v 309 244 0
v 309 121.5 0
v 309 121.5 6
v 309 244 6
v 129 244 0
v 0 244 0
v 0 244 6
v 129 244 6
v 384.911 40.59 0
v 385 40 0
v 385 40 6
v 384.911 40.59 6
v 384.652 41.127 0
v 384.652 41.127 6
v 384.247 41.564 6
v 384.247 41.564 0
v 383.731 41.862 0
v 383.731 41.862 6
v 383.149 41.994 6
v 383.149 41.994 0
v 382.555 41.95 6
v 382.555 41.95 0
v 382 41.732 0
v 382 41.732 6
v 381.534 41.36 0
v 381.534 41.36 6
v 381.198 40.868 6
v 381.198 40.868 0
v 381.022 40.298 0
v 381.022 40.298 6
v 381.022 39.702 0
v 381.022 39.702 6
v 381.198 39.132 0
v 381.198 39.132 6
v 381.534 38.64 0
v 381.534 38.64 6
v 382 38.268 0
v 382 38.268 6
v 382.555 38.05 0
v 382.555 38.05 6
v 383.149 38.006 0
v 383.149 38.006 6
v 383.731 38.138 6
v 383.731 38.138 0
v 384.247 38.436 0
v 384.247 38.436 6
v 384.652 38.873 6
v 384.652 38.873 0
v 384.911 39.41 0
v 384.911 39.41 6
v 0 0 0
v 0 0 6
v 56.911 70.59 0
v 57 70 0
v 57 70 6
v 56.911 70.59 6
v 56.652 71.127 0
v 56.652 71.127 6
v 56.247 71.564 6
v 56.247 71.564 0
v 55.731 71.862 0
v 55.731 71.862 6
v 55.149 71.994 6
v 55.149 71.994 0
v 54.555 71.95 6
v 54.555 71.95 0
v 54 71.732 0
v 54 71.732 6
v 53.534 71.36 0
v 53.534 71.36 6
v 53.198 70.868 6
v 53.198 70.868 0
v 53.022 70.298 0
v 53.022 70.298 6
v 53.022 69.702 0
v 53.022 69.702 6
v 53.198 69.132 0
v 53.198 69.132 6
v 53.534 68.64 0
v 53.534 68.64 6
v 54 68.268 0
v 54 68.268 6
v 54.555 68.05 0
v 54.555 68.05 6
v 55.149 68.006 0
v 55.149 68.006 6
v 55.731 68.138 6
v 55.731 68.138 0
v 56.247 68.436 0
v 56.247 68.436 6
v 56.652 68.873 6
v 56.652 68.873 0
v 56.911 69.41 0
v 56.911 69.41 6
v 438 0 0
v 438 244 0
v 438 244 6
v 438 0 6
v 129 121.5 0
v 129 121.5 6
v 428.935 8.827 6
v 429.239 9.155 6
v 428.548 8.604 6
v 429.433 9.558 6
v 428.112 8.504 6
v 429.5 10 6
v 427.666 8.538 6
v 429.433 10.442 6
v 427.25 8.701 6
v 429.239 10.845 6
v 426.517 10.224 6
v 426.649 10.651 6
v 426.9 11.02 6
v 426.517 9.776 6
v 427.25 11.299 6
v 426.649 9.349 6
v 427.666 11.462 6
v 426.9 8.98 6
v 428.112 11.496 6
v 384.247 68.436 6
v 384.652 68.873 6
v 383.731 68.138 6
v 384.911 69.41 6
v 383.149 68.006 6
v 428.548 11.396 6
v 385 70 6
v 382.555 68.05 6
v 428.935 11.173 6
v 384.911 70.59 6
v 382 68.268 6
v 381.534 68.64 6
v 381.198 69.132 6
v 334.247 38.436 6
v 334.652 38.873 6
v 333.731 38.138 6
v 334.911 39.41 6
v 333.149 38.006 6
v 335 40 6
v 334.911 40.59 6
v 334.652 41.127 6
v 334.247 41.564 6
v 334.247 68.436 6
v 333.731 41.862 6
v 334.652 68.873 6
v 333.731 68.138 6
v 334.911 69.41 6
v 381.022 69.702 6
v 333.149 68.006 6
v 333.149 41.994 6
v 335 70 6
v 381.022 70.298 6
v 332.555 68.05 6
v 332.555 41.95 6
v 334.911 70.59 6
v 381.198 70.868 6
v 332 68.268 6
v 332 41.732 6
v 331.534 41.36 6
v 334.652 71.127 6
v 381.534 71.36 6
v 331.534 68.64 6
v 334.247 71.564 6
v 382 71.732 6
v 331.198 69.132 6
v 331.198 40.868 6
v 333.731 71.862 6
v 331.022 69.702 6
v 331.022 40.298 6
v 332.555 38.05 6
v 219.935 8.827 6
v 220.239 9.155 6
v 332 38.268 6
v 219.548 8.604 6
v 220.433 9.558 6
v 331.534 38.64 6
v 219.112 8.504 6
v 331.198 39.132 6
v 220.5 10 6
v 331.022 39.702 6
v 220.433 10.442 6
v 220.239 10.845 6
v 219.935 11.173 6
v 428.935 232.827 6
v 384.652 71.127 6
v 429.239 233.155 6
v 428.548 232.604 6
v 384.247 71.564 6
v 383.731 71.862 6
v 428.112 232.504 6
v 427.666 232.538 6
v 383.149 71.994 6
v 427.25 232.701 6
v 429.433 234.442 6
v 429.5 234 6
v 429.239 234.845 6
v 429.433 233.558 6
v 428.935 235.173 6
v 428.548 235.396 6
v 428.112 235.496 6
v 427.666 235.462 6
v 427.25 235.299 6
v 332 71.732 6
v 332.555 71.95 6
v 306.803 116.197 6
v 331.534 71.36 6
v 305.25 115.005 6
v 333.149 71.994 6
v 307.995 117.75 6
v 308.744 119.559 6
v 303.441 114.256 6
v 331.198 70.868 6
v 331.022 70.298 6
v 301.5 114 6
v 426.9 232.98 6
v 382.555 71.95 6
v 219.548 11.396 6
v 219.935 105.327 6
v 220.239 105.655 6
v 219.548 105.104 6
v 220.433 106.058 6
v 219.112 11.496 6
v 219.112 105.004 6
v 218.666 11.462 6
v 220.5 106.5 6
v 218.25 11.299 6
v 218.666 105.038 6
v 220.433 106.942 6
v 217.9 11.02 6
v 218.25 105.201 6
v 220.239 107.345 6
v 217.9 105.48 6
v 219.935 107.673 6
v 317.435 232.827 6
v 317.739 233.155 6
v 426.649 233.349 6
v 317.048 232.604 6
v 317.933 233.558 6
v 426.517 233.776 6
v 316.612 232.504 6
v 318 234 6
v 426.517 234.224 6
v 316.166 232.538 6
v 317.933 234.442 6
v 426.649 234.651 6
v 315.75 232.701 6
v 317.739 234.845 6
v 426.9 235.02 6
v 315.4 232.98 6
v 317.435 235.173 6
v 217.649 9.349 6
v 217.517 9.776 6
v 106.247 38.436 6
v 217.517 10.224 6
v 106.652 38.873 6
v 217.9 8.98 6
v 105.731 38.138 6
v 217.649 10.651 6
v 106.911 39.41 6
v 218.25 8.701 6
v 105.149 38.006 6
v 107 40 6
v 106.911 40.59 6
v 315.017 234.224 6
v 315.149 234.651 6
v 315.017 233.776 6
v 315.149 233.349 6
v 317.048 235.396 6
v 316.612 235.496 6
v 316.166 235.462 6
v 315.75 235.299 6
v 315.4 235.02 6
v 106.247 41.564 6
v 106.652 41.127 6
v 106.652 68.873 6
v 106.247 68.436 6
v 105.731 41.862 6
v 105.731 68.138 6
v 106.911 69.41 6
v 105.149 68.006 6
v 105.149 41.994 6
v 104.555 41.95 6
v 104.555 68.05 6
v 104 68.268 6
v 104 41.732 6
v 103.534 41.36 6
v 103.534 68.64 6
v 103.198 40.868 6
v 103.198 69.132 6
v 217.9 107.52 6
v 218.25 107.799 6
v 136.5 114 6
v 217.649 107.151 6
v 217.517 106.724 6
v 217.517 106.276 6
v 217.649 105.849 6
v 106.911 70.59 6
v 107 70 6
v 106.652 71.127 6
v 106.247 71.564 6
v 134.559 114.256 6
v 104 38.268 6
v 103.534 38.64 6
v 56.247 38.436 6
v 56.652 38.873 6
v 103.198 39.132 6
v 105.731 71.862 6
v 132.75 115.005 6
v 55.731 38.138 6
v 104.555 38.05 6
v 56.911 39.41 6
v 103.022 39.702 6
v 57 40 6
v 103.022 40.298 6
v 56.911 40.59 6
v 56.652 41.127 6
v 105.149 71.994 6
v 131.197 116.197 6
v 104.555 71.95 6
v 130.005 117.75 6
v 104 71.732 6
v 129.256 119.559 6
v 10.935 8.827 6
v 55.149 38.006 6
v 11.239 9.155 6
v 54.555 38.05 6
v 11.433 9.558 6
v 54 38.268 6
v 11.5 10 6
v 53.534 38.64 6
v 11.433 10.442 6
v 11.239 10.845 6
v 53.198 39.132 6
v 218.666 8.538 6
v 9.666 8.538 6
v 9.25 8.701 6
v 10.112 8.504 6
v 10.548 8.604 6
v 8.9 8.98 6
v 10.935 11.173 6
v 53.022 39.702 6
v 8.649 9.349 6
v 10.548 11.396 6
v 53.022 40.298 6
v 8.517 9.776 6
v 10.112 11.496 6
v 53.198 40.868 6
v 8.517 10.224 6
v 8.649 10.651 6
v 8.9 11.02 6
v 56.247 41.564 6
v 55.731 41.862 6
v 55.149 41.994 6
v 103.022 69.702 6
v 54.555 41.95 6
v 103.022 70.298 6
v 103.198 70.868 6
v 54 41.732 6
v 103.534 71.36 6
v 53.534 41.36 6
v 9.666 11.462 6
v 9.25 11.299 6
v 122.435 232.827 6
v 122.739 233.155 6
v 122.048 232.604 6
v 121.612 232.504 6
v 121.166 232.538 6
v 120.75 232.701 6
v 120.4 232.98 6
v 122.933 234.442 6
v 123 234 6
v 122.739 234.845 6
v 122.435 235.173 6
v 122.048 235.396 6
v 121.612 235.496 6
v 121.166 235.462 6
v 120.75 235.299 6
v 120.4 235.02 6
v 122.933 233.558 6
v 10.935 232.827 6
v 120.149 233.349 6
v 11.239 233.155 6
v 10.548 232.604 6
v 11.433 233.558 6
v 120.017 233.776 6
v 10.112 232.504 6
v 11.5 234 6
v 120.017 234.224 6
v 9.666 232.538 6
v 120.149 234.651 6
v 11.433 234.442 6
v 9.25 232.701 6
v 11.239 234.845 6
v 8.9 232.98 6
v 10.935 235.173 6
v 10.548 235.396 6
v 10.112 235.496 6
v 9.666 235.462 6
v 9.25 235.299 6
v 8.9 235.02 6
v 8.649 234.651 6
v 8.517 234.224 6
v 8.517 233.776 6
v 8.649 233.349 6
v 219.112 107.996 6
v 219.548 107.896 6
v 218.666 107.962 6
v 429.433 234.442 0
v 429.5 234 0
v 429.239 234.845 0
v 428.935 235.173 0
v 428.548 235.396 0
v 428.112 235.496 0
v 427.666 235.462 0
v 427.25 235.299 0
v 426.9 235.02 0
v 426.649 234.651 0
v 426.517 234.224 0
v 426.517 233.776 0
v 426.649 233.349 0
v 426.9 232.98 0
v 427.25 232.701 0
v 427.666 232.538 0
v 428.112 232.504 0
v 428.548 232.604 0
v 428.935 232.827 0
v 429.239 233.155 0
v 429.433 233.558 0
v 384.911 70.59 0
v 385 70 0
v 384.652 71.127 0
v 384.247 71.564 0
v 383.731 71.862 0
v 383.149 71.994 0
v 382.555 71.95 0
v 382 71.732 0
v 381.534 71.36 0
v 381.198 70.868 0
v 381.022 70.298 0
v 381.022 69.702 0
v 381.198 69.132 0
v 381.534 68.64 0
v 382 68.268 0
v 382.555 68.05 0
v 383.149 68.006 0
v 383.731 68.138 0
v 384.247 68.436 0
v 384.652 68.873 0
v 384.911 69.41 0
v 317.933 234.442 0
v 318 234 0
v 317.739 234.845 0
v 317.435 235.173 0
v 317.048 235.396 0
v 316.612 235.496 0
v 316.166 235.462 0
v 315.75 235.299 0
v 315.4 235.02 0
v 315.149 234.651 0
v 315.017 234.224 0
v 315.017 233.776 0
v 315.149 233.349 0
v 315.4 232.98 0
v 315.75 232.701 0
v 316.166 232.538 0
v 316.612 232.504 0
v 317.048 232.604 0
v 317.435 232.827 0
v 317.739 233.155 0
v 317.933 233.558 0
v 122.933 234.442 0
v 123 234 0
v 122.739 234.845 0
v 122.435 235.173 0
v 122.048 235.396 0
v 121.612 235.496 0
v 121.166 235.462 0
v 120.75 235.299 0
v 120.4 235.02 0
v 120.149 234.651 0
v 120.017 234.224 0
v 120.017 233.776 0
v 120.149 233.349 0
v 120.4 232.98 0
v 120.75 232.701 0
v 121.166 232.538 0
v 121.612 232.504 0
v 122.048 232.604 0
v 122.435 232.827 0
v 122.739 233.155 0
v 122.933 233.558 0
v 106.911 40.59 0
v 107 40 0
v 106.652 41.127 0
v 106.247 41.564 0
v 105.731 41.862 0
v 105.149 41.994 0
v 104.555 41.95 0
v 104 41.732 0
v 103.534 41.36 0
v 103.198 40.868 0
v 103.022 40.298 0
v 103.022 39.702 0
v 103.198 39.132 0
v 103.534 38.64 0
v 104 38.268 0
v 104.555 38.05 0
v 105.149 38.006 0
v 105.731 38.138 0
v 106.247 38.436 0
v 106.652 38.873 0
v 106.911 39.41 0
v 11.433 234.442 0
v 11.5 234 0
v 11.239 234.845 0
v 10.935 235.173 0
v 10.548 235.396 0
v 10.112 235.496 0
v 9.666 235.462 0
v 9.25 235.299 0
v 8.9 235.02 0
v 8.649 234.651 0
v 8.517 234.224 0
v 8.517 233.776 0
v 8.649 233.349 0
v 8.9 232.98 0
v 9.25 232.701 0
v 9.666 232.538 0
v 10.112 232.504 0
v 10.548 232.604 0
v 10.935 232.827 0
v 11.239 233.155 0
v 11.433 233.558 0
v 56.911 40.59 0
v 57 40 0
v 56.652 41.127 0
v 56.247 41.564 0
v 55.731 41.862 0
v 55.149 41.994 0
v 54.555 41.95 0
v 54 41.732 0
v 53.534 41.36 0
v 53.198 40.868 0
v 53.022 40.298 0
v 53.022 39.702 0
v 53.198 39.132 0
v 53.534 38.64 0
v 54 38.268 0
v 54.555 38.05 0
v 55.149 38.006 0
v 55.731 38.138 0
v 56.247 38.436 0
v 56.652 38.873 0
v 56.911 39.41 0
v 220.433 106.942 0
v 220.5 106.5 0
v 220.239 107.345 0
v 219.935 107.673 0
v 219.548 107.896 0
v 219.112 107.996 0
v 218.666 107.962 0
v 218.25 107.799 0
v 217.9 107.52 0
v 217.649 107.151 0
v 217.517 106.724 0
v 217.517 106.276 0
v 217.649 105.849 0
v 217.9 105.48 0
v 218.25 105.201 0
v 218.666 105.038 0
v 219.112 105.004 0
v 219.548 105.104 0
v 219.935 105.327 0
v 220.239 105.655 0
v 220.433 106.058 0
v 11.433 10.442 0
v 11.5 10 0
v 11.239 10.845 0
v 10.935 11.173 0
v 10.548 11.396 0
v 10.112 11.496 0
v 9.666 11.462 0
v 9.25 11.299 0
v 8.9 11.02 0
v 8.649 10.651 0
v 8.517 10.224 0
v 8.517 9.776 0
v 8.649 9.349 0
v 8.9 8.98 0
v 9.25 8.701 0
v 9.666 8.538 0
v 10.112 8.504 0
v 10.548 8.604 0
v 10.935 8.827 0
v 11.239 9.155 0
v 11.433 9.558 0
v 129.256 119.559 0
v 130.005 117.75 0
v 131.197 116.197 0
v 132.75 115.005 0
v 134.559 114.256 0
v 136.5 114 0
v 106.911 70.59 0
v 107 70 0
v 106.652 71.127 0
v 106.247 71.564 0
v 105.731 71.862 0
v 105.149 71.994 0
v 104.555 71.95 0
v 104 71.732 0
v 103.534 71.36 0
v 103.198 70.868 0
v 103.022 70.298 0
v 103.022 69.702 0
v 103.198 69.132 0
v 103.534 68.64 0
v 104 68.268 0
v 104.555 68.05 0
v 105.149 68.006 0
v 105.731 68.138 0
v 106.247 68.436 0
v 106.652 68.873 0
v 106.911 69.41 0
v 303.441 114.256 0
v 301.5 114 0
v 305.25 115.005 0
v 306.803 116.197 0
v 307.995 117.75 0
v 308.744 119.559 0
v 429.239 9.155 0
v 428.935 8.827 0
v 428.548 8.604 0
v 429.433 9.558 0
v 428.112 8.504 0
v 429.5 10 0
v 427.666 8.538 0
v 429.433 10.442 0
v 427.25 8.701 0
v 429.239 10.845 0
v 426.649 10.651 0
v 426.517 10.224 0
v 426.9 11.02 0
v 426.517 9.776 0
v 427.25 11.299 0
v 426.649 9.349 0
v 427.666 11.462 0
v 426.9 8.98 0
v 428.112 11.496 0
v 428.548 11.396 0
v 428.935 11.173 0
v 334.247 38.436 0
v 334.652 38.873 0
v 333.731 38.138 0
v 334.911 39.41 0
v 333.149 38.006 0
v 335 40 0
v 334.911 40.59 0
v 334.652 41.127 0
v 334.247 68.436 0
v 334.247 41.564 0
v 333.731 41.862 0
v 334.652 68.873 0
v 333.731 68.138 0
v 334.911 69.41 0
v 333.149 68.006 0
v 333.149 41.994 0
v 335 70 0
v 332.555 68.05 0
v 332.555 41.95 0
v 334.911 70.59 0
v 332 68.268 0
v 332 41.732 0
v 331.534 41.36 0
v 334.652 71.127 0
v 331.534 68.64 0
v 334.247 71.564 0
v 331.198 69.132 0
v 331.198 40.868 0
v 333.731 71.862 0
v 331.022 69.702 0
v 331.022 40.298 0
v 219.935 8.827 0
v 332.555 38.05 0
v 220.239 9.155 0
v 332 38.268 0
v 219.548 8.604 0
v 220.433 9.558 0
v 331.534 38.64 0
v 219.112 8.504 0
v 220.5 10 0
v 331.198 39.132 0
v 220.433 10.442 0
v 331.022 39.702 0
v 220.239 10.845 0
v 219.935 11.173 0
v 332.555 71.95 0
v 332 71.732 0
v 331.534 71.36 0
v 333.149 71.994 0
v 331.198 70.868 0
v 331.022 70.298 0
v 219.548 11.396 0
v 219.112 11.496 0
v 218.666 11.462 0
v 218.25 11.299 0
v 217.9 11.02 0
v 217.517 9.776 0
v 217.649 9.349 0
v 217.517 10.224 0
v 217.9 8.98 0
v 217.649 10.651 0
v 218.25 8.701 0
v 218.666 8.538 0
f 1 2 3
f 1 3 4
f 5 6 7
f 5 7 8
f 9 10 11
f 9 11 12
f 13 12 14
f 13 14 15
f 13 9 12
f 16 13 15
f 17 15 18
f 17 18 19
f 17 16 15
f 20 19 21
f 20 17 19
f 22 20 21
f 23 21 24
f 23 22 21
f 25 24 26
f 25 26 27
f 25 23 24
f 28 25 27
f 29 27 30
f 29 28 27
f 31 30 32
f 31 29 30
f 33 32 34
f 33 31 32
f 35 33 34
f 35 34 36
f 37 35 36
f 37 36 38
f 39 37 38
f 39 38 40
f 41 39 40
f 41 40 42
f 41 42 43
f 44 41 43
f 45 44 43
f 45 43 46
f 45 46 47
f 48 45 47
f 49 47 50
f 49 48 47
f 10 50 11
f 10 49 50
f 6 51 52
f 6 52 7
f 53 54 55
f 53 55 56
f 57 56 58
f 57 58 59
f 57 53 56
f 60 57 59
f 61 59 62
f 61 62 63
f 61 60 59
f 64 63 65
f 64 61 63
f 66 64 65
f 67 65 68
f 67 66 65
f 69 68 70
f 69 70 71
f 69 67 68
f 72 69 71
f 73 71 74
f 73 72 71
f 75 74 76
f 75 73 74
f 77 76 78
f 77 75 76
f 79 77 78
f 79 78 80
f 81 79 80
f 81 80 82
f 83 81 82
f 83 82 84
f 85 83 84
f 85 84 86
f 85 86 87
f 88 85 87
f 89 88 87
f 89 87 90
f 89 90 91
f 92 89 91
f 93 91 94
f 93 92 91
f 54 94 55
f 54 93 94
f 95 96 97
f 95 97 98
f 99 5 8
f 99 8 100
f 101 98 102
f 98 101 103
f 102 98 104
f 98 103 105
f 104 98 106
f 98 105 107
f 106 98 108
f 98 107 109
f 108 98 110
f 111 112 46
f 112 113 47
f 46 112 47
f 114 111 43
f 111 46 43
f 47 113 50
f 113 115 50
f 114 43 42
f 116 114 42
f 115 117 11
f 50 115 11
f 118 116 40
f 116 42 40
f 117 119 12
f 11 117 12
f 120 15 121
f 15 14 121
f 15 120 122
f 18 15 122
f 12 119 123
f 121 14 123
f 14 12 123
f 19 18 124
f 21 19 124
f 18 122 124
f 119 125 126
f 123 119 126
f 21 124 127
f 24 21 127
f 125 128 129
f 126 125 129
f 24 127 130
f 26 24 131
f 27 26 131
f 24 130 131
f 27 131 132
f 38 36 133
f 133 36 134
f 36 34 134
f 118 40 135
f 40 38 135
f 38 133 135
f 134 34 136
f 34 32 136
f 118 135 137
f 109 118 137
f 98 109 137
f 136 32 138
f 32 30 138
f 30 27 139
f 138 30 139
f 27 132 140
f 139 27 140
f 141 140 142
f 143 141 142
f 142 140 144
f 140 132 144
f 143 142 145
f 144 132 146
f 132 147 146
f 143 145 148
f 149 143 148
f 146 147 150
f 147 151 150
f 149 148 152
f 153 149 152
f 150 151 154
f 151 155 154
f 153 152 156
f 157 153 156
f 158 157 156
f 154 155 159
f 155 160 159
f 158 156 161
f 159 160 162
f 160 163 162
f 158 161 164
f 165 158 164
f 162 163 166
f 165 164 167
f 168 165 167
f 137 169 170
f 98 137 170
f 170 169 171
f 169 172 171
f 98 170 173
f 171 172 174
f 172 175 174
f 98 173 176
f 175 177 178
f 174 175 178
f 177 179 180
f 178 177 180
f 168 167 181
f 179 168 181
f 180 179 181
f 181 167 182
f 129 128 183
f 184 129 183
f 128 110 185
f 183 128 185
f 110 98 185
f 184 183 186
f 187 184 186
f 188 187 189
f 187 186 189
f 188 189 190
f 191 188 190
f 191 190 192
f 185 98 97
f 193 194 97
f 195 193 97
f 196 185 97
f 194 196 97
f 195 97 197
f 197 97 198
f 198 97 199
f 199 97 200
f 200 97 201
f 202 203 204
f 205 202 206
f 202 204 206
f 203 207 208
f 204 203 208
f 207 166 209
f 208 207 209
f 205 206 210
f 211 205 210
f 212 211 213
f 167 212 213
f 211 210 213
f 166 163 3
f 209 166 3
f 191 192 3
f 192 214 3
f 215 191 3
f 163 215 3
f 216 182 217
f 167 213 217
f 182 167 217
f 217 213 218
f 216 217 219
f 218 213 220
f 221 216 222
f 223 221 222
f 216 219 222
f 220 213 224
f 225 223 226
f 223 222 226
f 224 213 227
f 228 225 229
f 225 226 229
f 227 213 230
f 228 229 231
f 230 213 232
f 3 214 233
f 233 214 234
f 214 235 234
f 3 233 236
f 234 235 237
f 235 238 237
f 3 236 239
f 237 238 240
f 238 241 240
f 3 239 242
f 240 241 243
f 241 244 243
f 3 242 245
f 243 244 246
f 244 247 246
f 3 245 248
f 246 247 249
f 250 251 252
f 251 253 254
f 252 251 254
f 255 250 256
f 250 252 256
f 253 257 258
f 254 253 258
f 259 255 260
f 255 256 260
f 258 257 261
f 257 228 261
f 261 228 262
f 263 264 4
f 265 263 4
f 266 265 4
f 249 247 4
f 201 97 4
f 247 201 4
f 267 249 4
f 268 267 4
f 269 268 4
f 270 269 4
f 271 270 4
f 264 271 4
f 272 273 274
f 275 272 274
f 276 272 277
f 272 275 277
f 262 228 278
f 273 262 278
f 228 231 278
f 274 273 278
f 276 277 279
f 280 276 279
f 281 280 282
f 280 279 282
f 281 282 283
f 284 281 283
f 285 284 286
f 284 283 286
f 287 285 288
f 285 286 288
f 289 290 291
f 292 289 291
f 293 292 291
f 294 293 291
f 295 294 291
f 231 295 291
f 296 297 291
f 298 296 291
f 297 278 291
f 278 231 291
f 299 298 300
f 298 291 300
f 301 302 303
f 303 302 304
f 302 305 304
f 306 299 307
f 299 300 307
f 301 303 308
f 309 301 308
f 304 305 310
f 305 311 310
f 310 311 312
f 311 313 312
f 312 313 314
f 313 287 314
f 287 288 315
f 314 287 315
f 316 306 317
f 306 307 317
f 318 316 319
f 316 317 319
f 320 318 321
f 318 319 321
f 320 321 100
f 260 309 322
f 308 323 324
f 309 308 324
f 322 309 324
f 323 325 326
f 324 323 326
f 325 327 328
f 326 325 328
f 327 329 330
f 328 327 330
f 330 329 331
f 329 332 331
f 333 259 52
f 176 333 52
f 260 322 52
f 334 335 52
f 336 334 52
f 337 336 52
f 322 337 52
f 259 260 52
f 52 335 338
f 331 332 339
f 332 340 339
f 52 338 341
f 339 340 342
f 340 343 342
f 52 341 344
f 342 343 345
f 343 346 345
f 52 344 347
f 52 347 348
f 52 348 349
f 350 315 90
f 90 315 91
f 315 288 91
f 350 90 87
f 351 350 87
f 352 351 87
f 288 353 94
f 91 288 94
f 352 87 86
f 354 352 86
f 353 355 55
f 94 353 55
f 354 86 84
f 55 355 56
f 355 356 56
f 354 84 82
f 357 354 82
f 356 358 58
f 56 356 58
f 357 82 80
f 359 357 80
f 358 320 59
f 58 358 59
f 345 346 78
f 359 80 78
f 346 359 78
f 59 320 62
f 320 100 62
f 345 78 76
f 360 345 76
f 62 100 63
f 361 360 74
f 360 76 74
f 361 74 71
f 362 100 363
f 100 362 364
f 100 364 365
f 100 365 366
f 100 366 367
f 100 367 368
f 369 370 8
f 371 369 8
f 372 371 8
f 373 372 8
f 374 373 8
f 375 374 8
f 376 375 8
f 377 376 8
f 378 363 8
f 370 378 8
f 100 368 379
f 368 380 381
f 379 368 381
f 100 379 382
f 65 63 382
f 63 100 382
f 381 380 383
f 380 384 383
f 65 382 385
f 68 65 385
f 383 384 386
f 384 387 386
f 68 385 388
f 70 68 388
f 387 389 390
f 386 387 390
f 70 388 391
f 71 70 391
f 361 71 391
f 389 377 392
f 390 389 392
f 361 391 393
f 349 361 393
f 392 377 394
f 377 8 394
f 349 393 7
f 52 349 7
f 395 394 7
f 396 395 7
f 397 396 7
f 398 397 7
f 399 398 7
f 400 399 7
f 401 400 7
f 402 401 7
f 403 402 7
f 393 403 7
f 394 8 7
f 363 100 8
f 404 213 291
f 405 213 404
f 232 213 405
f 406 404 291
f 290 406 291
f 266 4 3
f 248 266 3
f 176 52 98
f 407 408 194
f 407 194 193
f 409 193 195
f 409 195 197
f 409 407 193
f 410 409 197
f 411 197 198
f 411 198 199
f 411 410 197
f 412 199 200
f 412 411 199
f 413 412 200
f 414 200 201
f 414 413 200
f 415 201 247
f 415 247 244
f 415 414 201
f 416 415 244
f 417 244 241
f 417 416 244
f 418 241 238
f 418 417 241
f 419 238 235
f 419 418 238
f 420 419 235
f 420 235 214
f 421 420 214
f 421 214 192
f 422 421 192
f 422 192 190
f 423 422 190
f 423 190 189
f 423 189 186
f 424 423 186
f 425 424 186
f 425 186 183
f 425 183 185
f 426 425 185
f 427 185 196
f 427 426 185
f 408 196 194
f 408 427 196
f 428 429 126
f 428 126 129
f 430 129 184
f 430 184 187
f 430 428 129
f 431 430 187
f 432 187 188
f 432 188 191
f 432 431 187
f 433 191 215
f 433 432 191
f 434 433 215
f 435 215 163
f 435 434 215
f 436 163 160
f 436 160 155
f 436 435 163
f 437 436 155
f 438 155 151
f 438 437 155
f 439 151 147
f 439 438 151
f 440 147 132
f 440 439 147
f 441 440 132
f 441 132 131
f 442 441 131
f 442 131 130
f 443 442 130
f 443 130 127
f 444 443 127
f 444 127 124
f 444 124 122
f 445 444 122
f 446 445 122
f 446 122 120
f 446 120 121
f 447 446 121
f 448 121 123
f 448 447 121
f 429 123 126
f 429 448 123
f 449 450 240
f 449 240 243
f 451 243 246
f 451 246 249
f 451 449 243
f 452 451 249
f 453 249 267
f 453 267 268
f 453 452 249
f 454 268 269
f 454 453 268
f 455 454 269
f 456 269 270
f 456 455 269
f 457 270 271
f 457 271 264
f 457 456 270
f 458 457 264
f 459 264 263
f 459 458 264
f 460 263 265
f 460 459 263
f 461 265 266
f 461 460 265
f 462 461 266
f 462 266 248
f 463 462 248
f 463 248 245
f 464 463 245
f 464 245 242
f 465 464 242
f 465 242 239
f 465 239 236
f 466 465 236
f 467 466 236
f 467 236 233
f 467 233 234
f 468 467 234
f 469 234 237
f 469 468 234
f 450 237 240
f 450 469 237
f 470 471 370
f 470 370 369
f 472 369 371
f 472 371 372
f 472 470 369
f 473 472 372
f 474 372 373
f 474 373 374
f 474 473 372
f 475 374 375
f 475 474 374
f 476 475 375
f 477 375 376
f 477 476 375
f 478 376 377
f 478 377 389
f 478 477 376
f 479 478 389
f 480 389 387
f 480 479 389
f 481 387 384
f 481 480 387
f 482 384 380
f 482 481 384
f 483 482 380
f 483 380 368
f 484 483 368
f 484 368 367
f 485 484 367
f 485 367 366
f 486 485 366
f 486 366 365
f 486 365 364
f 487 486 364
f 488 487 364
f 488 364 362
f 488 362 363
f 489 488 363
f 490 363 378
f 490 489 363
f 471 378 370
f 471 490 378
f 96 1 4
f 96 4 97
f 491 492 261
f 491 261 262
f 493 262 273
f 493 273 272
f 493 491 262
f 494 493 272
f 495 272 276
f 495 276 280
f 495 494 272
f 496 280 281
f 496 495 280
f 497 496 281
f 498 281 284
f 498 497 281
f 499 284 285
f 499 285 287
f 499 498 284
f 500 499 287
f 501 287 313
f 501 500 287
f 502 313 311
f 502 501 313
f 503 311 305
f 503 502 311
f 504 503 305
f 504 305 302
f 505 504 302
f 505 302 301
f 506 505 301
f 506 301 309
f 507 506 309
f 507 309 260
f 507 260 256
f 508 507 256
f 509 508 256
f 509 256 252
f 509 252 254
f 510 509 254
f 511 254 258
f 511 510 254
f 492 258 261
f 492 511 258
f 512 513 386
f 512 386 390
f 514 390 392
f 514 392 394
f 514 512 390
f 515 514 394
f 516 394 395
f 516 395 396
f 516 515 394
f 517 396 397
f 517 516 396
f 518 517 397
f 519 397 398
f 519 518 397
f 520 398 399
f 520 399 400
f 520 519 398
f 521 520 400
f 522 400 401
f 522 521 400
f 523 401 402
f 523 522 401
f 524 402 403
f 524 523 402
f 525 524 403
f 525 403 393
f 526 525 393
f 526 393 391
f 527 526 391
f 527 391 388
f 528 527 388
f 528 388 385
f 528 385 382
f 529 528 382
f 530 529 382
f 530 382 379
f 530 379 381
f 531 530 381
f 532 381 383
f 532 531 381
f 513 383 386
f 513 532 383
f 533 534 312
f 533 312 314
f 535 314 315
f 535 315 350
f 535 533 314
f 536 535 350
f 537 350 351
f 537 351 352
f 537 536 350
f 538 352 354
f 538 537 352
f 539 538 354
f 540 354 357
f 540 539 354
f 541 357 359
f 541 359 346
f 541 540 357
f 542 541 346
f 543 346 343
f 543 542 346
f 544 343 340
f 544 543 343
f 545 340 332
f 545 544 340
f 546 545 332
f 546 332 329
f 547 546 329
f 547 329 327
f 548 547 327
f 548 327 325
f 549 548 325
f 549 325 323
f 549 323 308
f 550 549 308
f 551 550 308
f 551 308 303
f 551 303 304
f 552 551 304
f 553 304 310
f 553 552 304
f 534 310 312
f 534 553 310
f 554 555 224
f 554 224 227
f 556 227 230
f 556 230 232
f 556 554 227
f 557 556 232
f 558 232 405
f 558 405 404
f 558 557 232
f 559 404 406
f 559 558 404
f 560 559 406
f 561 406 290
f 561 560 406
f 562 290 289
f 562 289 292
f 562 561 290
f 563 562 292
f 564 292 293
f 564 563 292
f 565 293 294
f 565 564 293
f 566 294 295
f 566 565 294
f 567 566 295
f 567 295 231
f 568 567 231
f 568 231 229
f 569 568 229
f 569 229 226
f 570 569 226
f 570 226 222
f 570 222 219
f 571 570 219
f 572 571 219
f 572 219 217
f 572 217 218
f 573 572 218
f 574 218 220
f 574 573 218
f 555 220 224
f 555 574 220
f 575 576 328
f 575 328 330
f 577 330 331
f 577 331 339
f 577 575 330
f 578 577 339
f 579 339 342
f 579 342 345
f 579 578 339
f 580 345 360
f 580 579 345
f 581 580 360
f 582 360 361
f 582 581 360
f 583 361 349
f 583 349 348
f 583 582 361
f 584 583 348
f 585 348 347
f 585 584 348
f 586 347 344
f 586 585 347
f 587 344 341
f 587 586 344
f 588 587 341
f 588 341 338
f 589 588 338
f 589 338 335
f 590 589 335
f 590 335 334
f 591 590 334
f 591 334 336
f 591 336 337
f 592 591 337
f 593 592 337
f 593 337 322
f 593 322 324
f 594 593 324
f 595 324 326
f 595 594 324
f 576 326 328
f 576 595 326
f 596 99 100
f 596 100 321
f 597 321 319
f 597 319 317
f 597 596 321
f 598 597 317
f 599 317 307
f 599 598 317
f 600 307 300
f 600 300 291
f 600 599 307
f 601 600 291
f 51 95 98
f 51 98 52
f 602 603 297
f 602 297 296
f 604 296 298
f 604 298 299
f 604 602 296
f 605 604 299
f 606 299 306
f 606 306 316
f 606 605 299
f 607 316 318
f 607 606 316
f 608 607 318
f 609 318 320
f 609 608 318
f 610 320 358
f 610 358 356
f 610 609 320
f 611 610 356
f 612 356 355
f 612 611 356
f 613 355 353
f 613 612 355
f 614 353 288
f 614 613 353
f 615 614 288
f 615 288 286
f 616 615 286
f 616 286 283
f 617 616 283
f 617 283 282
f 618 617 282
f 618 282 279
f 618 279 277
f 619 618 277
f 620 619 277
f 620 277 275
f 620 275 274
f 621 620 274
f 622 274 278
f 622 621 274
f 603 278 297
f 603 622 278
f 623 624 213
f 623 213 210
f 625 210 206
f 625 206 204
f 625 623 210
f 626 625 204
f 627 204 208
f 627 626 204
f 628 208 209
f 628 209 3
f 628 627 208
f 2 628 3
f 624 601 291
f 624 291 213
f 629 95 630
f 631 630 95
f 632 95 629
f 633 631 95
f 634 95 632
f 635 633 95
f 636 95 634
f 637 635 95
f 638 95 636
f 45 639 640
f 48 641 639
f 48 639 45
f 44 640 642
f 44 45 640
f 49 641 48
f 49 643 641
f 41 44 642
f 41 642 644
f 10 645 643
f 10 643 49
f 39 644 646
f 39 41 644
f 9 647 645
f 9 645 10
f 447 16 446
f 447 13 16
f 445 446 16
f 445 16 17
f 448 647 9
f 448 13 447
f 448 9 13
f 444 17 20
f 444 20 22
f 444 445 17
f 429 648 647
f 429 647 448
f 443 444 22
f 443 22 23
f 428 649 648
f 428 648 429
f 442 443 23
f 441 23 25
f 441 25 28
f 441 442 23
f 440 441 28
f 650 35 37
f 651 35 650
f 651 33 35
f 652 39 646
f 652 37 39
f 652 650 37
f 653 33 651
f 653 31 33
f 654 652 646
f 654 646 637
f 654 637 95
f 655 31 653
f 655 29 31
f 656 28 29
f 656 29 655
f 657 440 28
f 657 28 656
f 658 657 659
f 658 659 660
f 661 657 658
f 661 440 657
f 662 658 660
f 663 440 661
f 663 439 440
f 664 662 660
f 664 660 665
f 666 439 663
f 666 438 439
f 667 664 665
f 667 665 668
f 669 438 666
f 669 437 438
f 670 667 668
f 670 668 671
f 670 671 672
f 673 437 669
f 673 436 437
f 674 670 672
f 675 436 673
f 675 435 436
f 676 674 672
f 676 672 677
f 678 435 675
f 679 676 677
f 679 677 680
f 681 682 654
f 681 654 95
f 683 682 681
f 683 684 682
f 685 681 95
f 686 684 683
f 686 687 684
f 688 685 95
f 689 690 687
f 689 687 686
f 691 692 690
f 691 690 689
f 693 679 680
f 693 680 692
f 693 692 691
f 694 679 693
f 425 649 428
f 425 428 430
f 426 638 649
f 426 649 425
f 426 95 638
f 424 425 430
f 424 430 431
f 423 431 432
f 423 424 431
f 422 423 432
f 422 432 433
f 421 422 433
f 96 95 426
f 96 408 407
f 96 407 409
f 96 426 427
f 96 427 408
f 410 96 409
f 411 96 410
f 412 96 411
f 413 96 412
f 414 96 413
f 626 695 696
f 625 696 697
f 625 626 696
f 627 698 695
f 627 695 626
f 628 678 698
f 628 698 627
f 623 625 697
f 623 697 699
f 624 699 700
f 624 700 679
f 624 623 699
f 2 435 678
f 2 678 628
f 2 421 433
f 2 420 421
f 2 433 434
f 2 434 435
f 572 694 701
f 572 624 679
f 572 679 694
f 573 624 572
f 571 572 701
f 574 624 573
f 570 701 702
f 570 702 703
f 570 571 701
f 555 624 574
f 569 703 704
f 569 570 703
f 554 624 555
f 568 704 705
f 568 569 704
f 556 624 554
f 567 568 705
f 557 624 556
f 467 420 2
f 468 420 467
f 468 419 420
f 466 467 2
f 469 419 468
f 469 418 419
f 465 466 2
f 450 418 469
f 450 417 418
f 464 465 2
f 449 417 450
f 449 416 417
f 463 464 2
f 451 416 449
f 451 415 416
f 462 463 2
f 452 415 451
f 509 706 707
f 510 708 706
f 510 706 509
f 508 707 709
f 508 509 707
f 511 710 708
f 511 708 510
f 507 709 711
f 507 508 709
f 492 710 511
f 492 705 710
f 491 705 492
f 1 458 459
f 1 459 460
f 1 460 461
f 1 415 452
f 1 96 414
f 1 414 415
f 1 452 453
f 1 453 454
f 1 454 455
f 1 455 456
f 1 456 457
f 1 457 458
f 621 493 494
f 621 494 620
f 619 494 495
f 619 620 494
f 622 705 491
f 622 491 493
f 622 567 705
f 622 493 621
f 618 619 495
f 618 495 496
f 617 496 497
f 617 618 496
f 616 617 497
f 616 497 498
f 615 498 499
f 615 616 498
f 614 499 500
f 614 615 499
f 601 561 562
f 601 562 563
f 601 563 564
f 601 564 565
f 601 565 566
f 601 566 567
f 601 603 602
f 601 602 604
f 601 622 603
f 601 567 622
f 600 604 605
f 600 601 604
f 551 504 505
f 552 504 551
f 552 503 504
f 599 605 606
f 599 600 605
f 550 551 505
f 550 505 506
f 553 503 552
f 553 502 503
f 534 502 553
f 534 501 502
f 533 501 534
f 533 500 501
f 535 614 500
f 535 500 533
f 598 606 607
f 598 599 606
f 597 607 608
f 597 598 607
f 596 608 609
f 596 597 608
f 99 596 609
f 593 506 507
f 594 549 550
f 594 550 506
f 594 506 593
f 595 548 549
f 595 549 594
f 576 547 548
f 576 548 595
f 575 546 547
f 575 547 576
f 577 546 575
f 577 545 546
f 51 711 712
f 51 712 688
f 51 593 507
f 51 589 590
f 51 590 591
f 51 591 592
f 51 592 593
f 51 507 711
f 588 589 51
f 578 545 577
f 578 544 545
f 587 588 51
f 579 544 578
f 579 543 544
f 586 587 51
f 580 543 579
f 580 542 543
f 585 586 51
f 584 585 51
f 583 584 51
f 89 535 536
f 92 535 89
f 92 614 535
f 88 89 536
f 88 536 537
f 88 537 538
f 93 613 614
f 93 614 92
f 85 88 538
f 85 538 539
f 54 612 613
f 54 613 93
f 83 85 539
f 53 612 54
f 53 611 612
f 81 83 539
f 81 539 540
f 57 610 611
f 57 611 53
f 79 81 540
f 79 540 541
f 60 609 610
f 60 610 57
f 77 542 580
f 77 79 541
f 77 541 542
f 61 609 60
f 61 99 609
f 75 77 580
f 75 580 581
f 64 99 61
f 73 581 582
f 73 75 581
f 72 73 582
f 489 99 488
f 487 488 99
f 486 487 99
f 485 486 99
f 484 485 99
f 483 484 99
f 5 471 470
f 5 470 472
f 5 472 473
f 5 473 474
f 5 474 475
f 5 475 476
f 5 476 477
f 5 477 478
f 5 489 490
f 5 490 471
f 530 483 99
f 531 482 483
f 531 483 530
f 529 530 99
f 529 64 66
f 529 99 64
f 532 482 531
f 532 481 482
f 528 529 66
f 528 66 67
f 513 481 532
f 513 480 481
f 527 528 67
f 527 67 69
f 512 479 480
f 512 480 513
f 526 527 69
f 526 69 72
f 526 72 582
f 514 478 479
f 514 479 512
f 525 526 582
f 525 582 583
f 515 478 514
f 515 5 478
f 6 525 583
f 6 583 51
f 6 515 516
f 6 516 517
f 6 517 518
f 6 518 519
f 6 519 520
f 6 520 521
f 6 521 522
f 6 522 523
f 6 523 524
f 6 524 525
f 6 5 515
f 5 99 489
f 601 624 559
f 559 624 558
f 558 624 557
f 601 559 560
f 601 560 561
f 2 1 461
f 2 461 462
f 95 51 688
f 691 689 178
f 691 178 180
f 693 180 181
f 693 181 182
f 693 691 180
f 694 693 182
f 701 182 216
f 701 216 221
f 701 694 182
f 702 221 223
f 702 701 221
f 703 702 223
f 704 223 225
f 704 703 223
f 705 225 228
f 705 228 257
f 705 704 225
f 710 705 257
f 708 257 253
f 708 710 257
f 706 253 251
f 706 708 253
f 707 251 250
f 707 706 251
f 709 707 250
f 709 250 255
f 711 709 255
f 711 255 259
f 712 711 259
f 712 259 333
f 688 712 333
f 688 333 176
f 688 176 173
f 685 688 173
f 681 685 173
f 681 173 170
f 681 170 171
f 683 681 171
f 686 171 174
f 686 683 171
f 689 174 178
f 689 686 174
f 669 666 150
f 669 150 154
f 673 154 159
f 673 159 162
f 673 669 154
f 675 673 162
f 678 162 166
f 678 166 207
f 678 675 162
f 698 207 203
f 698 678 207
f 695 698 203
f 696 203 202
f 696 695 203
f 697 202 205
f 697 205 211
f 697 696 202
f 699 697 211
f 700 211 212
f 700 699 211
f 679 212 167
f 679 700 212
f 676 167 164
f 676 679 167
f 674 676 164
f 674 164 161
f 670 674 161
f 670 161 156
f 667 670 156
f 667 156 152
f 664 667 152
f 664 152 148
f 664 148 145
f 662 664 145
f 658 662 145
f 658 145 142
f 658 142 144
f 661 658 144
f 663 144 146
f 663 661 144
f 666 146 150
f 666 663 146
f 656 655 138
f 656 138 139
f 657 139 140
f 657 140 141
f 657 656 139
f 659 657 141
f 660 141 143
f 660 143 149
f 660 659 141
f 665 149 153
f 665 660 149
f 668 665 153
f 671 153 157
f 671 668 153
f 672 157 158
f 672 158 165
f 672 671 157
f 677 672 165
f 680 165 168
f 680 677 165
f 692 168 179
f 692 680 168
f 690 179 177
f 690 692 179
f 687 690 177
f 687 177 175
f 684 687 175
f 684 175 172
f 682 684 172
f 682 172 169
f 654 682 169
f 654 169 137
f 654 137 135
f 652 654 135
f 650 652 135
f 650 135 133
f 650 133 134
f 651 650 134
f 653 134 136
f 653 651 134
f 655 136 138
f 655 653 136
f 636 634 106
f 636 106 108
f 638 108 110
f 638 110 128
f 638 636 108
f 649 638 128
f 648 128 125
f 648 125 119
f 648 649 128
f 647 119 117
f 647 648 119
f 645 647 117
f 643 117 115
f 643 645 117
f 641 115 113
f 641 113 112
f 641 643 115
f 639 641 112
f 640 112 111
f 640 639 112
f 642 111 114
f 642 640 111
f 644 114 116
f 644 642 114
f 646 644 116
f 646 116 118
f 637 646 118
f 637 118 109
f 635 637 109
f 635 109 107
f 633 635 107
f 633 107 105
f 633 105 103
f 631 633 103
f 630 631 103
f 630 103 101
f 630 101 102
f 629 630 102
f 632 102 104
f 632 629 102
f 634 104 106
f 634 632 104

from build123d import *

# Parameters (mm, degrees)
SKETCH_1_R      = 1.5
SKETCH_1_R_2    = 2
EXTRUDE_1_DEPTH = 6


with BuildPart() as part:
    # Эскиз1 → Бобышка-Вытянуть1 (new body)
    with BuildSketch(Plane.XY):
        with BuildLine():
            Line((129, 244), (129, 121.5))
            ThreePointArc((129, 121.5), (131.196699141, 116.196699141), (136.5, 114))
            Line((136.5, 114), (301.5, 114))
            ThreePointArc((301.5, 114), (306.803300859, 116.196699141), (309, 121.5))
            Line((309, 121.5), (309, 244))
            Line((309, 244), (438, 244))
            Line((438, 244), (438, 0))
            Line((438, 0), (0, 0))
            Line((0, 0), (0, 244))
            Line((0, 244), (129, 244))
        make_face()
        with Locations((10, 10)):
            Circle(SKETCH_1_R, mode=Mode.SUBTRACT)
        with Locations((10, 234)):
            Circle(SKETCH_1_R, mode=Mode.SUBTRACT)
        with Locations((121.5, 234)):
            Circle(SKETCH_1_R, mode=Mode.SUBTRACT)
        with Locations((316.5, 234)):
            Circle(SKETCH_1_R, mode=Mode.SUBTRACT)
        with Locations((428, 234)):
            Circle(SKETCH_1_R, mode=Mode.SUBTRACT)
        with Locations((428, 10)):
            Circle(SKETCH_1_R, mode=Mode.SUBTRACT)
        with Locations((219, 106.5)):
            Circle(SKETCH_1_R, mode=Mode.SUBTRACT)
        with Locations((219, 10)):
            Circle(SKETCH_1_R, mode=Mode.SUBTRACT)
        with Locations((333, 70)):
            Circle(SKETCH_1_R_2, mode=Mode.SUBTRACT)
        with Locations((383, 70)):
            Circle(SKETCH_1_R_2, mode=Mode.SUBTRACT)
        with Locations((383, 40)):
            Circle(SKETCH_1_R_2, mode=Mode.SUBTRACT)
        with Locations((333, 40)):
            Circle(SKETCH_1_R_2, mode=Mode.SUBTRACT)
        with Locations((55, 70)):
            Circle(SKETCH_1_R_2, mode=Mode.SUBTRACT)
        with Locations((105, 70)):
            Circle(SKETCH_1_R_2, mode=Mode.SUBTRACT)
        with Locations((55, 40)):
            Circle(SKETCH_1_R_2, mode=Mode.SUBTRACT)
        with Locations((105, 40)):
            Circle(SKETCH_1_R_2, mode=Mode.SUBTRACT)
    extrude(amount=EXTRUDE_1_DEPTH)


solid = part.part
